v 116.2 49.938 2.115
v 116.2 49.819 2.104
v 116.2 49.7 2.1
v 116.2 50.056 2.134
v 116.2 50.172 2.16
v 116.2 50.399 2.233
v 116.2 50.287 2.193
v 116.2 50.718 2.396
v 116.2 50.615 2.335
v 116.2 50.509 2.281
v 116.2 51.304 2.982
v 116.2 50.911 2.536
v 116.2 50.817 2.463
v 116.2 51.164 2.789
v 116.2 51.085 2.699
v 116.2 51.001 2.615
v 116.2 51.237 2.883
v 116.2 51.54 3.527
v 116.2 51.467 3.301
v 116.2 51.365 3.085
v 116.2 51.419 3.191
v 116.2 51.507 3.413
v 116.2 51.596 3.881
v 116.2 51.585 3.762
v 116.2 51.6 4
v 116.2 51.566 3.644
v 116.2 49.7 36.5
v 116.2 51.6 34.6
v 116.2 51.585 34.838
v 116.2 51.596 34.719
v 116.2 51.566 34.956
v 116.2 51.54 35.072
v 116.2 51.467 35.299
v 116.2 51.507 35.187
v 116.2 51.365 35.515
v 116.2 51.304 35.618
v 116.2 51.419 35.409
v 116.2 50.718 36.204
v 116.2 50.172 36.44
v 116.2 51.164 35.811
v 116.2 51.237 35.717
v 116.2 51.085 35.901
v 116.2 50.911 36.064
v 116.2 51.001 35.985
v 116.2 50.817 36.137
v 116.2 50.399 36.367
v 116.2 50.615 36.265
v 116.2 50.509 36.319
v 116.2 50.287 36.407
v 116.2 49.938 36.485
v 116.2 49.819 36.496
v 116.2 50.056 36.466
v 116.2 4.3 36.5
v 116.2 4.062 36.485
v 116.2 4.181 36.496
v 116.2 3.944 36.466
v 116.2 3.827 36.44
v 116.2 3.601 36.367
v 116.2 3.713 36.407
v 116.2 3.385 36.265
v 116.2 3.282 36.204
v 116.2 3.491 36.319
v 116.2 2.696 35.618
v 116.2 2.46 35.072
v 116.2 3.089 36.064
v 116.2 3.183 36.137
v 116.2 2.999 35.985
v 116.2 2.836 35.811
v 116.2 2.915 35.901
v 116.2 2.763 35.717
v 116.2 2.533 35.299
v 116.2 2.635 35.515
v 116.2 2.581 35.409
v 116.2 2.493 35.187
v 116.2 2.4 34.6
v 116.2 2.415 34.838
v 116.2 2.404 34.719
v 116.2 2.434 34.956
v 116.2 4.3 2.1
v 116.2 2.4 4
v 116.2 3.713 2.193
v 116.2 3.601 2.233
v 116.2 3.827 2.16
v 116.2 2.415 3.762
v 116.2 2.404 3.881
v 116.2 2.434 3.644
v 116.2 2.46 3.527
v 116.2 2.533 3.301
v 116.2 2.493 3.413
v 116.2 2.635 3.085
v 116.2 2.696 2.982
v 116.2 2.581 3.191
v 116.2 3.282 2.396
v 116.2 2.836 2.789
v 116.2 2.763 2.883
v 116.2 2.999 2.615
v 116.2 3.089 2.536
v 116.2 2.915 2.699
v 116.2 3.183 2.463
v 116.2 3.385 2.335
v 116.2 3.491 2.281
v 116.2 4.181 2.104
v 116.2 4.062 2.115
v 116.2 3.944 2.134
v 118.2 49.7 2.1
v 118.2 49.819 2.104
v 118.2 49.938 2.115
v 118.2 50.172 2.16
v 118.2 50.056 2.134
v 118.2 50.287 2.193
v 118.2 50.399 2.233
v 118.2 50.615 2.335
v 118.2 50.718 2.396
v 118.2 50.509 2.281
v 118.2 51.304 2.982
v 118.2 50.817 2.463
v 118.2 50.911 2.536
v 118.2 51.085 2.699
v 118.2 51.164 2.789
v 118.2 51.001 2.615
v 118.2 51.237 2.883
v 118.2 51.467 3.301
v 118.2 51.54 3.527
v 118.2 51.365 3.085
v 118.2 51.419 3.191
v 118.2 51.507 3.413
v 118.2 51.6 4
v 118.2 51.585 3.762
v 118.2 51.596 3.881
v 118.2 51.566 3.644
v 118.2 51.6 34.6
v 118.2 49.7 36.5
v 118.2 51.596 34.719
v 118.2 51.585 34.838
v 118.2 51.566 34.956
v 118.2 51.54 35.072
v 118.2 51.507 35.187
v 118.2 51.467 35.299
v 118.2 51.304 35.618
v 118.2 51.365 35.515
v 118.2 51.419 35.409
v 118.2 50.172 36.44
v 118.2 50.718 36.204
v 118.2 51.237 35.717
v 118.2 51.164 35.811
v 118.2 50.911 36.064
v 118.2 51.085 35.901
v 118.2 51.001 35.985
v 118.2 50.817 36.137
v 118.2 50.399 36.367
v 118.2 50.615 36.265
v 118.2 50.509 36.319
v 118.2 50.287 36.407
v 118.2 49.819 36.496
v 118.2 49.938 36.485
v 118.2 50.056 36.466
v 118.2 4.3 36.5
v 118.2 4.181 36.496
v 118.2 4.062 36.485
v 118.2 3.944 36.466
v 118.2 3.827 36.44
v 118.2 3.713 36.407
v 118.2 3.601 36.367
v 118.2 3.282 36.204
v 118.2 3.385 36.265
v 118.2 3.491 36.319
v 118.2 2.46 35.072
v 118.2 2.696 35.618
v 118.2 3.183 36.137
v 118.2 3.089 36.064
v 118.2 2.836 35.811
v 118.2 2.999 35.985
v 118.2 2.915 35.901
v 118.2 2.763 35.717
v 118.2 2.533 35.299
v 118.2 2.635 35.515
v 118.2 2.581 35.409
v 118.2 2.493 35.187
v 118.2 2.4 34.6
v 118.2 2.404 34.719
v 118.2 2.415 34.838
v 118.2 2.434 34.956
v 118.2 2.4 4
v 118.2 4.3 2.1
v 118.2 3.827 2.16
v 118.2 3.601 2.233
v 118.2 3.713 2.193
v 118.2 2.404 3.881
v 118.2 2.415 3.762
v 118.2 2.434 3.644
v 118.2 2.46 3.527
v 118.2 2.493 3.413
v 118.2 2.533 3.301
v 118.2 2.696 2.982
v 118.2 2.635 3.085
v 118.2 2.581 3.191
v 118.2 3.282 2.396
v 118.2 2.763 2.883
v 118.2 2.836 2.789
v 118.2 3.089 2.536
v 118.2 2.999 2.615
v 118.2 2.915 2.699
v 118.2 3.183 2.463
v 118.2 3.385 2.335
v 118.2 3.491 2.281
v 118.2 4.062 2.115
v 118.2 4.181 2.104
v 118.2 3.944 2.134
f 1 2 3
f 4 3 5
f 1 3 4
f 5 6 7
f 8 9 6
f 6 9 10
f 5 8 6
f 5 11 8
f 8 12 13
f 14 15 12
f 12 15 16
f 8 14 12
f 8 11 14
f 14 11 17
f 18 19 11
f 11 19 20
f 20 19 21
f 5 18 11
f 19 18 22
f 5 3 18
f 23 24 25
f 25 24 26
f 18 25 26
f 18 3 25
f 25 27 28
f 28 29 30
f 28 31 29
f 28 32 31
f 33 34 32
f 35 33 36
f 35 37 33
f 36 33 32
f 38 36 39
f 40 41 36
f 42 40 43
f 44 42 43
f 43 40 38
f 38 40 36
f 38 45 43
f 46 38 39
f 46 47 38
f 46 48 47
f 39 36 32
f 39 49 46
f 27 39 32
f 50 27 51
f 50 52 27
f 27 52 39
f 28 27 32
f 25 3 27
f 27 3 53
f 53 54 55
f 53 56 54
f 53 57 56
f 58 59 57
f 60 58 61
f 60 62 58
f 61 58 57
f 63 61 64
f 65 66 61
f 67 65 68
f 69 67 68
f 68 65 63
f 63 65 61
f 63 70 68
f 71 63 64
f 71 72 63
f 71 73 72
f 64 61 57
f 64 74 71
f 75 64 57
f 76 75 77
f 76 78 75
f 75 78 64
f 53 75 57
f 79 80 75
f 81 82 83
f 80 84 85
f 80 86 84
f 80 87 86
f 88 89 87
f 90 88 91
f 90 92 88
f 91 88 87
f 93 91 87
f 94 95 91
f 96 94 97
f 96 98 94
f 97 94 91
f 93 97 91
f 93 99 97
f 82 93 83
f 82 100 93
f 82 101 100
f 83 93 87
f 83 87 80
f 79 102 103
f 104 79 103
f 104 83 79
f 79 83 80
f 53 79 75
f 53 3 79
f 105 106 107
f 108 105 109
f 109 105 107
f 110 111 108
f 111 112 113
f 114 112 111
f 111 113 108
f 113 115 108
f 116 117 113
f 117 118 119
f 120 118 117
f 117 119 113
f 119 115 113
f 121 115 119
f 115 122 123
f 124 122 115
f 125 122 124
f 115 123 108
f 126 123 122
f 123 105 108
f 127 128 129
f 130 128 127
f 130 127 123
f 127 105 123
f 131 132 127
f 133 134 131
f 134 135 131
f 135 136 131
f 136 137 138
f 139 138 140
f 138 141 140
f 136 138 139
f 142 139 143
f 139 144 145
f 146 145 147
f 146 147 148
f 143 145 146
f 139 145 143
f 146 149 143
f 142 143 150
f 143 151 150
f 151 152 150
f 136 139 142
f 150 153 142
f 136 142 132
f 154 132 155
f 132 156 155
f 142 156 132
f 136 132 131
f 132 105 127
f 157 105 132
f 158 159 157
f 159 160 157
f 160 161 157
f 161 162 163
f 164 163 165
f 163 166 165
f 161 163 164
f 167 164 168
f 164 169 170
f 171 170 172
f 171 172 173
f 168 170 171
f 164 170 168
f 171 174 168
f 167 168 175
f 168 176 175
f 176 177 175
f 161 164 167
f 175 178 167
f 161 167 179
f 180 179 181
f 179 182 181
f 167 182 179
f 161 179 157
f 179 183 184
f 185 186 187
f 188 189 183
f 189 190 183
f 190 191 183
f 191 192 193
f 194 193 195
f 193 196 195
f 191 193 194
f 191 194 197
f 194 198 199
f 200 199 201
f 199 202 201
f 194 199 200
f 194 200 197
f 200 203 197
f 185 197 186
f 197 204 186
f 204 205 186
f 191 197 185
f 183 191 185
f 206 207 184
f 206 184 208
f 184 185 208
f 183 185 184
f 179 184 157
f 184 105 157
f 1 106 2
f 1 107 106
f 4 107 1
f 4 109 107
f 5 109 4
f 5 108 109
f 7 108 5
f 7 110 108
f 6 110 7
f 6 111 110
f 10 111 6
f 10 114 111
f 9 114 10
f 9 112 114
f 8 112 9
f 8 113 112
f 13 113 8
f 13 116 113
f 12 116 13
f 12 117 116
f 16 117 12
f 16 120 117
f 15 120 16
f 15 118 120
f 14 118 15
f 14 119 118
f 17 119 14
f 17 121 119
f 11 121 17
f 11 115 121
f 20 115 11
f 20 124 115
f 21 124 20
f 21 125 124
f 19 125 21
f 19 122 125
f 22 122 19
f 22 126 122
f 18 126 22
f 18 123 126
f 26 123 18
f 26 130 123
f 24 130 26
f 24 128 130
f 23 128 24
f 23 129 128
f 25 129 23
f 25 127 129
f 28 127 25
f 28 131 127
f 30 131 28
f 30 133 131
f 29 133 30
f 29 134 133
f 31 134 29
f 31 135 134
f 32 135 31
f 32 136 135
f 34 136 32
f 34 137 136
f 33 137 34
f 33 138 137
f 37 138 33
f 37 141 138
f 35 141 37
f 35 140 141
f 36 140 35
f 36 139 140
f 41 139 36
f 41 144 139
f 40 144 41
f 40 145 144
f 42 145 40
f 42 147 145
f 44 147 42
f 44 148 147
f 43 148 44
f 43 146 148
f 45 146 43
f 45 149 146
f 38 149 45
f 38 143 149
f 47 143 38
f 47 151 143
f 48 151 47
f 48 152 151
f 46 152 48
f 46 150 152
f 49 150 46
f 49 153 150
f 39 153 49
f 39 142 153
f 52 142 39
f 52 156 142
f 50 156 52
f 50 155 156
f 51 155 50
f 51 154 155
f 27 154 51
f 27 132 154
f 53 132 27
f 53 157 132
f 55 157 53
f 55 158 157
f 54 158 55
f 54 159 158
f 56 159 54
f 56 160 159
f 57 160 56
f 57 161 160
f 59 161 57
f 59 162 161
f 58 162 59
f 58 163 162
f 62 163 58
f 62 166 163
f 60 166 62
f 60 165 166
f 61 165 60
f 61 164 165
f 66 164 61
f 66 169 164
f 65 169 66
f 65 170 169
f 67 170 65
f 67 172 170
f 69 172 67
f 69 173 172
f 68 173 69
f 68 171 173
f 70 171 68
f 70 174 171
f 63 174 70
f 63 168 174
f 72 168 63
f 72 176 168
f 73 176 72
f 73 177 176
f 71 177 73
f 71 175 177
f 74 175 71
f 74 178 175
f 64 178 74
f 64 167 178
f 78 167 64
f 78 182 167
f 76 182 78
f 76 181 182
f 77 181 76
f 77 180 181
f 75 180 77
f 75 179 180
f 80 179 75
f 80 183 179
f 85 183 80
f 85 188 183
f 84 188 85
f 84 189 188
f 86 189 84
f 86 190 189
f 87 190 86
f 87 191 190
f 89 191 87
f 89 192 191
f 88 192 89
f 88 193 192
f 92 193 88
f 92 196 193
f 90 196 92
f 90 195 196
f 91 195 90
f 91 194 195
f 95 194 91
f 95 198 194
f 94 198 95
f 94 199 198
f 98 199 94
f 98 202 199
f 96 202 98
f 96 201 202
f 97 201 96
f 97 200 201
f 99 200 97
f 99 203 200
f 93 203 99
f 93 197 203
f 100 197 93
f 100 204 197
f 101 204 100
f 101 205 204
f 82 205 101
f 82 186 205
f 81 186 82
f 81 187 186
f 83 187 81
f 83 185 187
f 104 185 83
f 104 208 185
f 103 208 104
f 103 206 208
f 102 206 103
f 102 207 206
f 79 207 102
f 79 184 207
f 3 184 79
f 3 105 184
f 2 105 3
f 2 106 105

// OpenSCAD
/* Box design originally by:
////////////////////////////////////////////////////////////////////
              -    FB Aka Heartman/Hearty 2016     -
              -   http://heartygfx.blogspot.com    -
              -       OpenScad Parametric Box      -
              -         CC BY-NC 3.0 License       -
////////////////////////////////////////////////////////////////////

Improved by jbebel:
http://github.com/jbebel/Ultimate-Box-Maker

To create a box, start by modifying the numerical parameters in the sections
below. This can be accomplished using a release of OpenSCAD newer than 2015.03.
As of the time of writing, this means that a development snapshot is required.
The Thingiverse Customizer may also potentially work, but at the time of
writing, it was inoperable.

The simplest choice is to hand-edit the .scad file. Feature toggles are
annotated with a comment. The other numerical parameters are measurements in
mm. Everything is parametrized, so if you double all the non-feature parameters
you will double the box size in every dimension. Certain parameters are derived
from other parameters. If you wish to override them, you may, but sensible
defaults have been chosen. Notably the design in this revision is particularly
PCB-centric, in that you should start with your PCB size and adjust the margins
around it to determine the box size. If you care more about the box size, you
can set the Length, Width, and Height explicitly, but read the comments around
them.

Once your box is sized appropriately, you can use the Panel modules to design
the holes and text for the front and back panels. Helper variables are provided
to assist you in positioning these holes relative to the PCB, if your holes are
for PCB-mounted components.

When you are ready to print, adjust the values in the "STL element to export"
section, and export each part one at a time.

Experimental options are provided for a screwless design, but these are
untested. In particular, the box fixation tabs may need thicknesses adjusted
in order to have the appropriate flexibility.
*/

// preview[view:north east, tilt:top diagonal]
//----------------------- Box parameters ---------------------------

/* [Box options] */
// - Wall thickness
Thick = 2;
// - Panel thickness
PanelThick = 2;
// - Font Thickness
FontThick = 0.5;
// - Filet Radius
Filet = 2;
// - 0 for beveled, 1 for rounded
Round = 1; // [0:No, 1:Yes]
// - Printer margin around interior cutouts
CutoutMargin = 0.3;
// - Margin between mating parts
PartMargin = 0.1;
// - PCB feet? (x4)
PCBFeet = 1; // [0:No, 1:Yes]
// - Decorations?
Decorations = 1; // [0:No, 1:Yes]
// - Decorations to ventilation holes
Vent = 1; // [0:No, 1:Yes]
// - Decoration-Holes width (in mm)
Vent_width = 3;
// - Tolerance (Panel/rails gap on one edge)
PanelThickGap = CutoutMargin + PartMargin;
PanelVerticalGap = PartMargin;
PanelHorizontalGap = CutoutMargin + PartMargin;


/* [Box Fixation Tabs] */
// - Side screw hole (or snap) diameter
ScrewHole = 2.2606;
// - Screw thread major diameter for outer shell
BoxHole = 2.8448;
// Thickness of fixation tabs
TabThick = 2;
// Back left tab
BLTab = 1; // [0:Bottom, 1:Top]
// Back right tab
BRTab = 1; // [0:Bottom, 1:Top]
// Front left tab
FLTab = 1; // [0:Bottom, 1:Top]
// Front right tab
FRTab = 1; // [0:Bottom, 1:Top]
// EXPERIMENTAL: Snap tabs
SnapTabs = 0; // [0:Screws, 1:Snaps]


/* [PCB options] */
// - PCB Length
PCBLength = 109;
// - PCB Width
PCBWidth = 40;
// - PCB Thickness
PCBThick = 1.6;
// You likely need to maintain |TabThick| margin on the left and right for tabs
// and whatnot.
// - Margin between front panel and PCB
FrontEdgeMargin = 1;
// - Margin between back panel and PCB
BackEdgeMargin = 1;
// - Margin between left wall and PCB
LeftEdgeMargin = 5;
// - Margin between right wall and PCB
RightEdgeMargin = 5;
// - Margin between top of PCB and box top.
TopMargin = 25;


/* [PCB_Feet] */
// - Foot height above box interior
FootHeight = 8;
// - Foot diameter
FootDia = 8;
// - Hole diameter, or peg for screwless design
FootHole = 0; // tap size for #4 coarse-thread
// - EXPERIMENTAL Screwless design
Screwless = 0; // [0:Screws, 1:Screwless]
FootFilet = 0;

// Foot centers are specified as distance from PCB back-left corner.
// X is along the "length" axis, and Y is along the "width" axis.
// - Foot 1 distance from back PCB edge
Foot1X = 4;
// - Foot 1 distance from left PCB edge
Foot1Y = 13;
// - Foot 2 distance from back PCB edge
Foot2X = 4;
// - Foot 2 distance from right PCB edge
Foot2YFromEdge = 25;
Foot2Y = PCBWidth - Foot2YFromEdge;

// - Foot 3 distance from front PCB edge
Foot3XFromEdge = 12;
Foot3X = PCBLength - Foot3XFromEdge;
// - Foot 3 distance from left PCB edge
Foot3Y = 3;

// - Foot 4 distance from front PCB edge
Foot4XFromEdge = 11;
Foot4X = PCBLength - Foot4XFromEdge;
// - Foot 4 distance from right PCB edge
Foot4YFromEdge = 4;
Foot4Y = PCBWidth - Foot4YFromEdge;


/* [STL element to export] */
// - Top shell
TShell = 0; // [0:No, 1:Yes]
// - Bottom shell
BShell = 0; // [0:No, 1:Yes]
// - Front panel
FPanL = 1; // [0:No, 1:Yes]
// - Back panel
BPanL = 0; // [0:No, 1:Yes]
// - Panel holes and text
PanelFeatures = 0; // [0:No, 1:Yes]


/* [Hidden] */
// - feet color
color_feet = "Red";

// - Shell color
Couleur1 = "Orange";
// - Panel color
Couleur2 = "OrangeRed";
// - Text color
TextColor = "White";
// - making decorations thicker if it is a vent to make sure they go through
// shell
// Add a small number to Thick in case Filet is 0.
Dec_Thick = Vent ? Thick*1.001 + Filet : Thick/2;
// Separate vents with a square pillar by default.
Dec_Spacing = Thick + Vent_width;
// X offset to center of first vent
Dec_Offset = Thick*2 + PanelThick + PanelThickGap*2 + Dec_Spacing - Vent_width/2;

// Resolution based on Round parameter. Set this first number to something
// smaller to speed up processing. It should always be a multiple of 4.
Resolution = Round ? 100: 4;

/* Calculate box dimensions from PCB. If you want a more box-centric design
   where the outer diameter of the box matters more than the margins around
   the PCB you can set these manually. The PCB will still be placedaccording
   to the left and back margins, and if you want to use the screwless box
   design, you will need to set the TopMargin to
   (Height - Thick*2 - FootHeight - PCBThick)
*/
Length = PCBLength + FrontEdgeMargin + BackEdgeMargin + ((Thick + PanelThick + PanelThickGap*2)*2);
Width = PCBWidth + LeftEdgeMargin + RightEdgeMargin + Thick*2;
Height = FootHeight + PCBThick + TopMargin + Thick*2;
echo("Box: ", Length=Length, Width=Width, Height=Height);
// X position inset of mounting holes and tabs
MountInset = Thick*3 + PanelThick + PanelThickGap*2 + ScrewHole*4;

// Calculate panel dimensions from box dimensions.
PanelWidth = Width - Thick*2 - PanelHorizontalGap*2;
PanelHeight = Height - Thick*2 - PanelVerticalGap*2;


/*  Panel Manager

    Use the below 4 modules to produce holes and text on the front and back
    panels. The holes modules should contain instances of SquareHole or
    CylinderHole defined later in this file. The text modules should contain
    instances of LText or CText defined later in this file. It is
    recommended to use variables that you define for your needs to create
    the size and positions of these objects.
*/

// Calculate board-relative positions with respect to the panel, for
// convenience in placing panel elements.
TopOfBoardWRTPanel = FootHeight + PCBThick - PanelVerticalGap;
LeftEdgeOfBoardWRTFPanel = LeftEdgeMargin - PanelHorizontalGap;
LeftEdgeOfBoardWRTBPanel = RightEdgeMargin - PanelHorizontalGap;
// Visible panel edges
PanelBottomEdge = Thick - PanelVerticalGap;
PanelTopEdge = PanelHeight - Thick + PanelVerticalGap;
PanelLeftEdge = Thick - PanelHorizontalGap;
PanelRightEdge = PanelWidth - Thick + PanelHorizontalGap;


// Holes for front panel
module FPanelHoles() {
    // SquareHole(On/Off, Xpos,Ypos,Length,Width,Filet)
    SquareHole(1, 20, 20, 15, 10, 1);
    SquareHole(1, 40, 20, 15, 10, 1);
    SquareHole(1, 60, 20, 15, 10, 1);
    // CylinderHole(On/Off, Xpos, Ypos, Diameter)
    CylinderHole(1, 27, 40, 8);
    CylinderHole(1, 47, 40, 8);
    CylinderHole(1, 67, 40, 8);
    SquareHole(1, 20, 50, 80, 30, 3);
    CylinderHole(1, 93, 30, 10);
    SquareHole(1, 120, 20, 30, 60, 3);
}


// Text for front panel
module FPanelText() {
    // LText(On/Off, Xpos, Ypos, "Font", Size, "Text", "HAlign", "VAlign")
    LText(1, 20, 83, "Arial Black", 4, "Digital Screen", HAlign="left");
    LText(1, 120, 83, "Arial Black", 4, "Level", HAlign="left");
    LText(1, 20, 11, "Arial Black", 6, "  1     2      3", HAlign="left");
    // CText(On/Off, Xpos, Ypos, "Font", Size, Diameter, Arc(Deg), Starting Angle(Deg),"Text")
    CText(1, 93, 29, "Arial Black", 4, 10, 180, 0,
          ["1", "." , "3", "." , "5", "." , "7", "." , "9", "." , "11"]);
}


// Holes for back panel
module BPanelHoles() {
    CylinderHole(1,
                 LeftEdgeOfBoardWRTBPanel + 16.4,
                 TopOfBoardWRTPanel + 7,
                 5 + PartMargin*2);
    SquareHole(1,
               LeftEdgeOfBoardWRTBPanel + 37.3,
               TopOfBoardWRTPanel,
               39.2,
               12.55,
               1);
}


// Text for back panel
module BPanelText() {
    LText(1,
          LeftEdgeOfBoardWRTBPanel + 16.4,
          TopOfBoardWRTPanel + 7 + 5,
          "Arial Black",
          4, "PWR"
    );
    LText(1,
          LeftEdgeOfBoardWRTBPanel + 37.3 + 39.2/2,
          TopOfBoardWRTPanel + 12.55 + 2,
          "Arial Black",
          4,
          "DATA"
    );
}


// ------- You probably don't need to modify anything below this line. --------


/* Generic rounded box

    Produces a box of the specified dimensions. Corners are rounded
    according to Filet and Resolution parameters.

    Arguments:
    xshrink: the amount to reduce the length on one end compared to the full
        length
    yzshrink: the amount to reduce the width or height on one edge compared
        to the full box
*/
module RoundBox(xshrink=0, yzshrink=0) {
    Filet = (Filet > Thick*2) ? Filet - yzshrink : Filet;
    translate([xshrink, yzshrink, yzshrink]) {
        rotate([90, 0, 90]) {
            linear_extrude(height=Length - xshrink*2) {
                translate([Filet, Filet, 0]) {
                    offset(r=Filet, $fn=Resolution) {
                        square([Width - 2*yzshrink - 2*Filet, Height - 2*yzshrink - 2*Filet]);
                    }
                }
            }
        }
    }
}


/*  MainBox: Main box module

    This module produces the simple main box half. No feet, tabs, vents or
    fixation is applied here.
*/
module MainBox() {
    difference() {
        union() {
            // Makes a hollow box with walls of Thick thickness.
            difference() {
                RoundBox();
                RoundBox(xshrink=Thick, yzshrink=Thick);
            }
            // Makes interior backing for panel as a wall
            difference() {
                RoundBox(xshrink=(Thick + PanelThick + PanelThickGap*2), yzshrink=Thick/2);
                RoundBox(xshrink=(Thick*2 + PanelThick + PanelThickGap*2));
            }
        }
        // Remove the top half
        translate([-Thick, -Thick, Height/2]) {
            cube([Length + Thick*2, Width + Thick*2, Height]);
        }
        // Remove the center for panel visibility.
        RoundBox(xshrink=-Thick, yzshrink=Thick*2);
    }
}


/*  decoration: a single box decoration
*/
module decoration() {
    translate([-Vent_width/2, -Thick, -Thick]) {
        cube([Vent_width, Dec_Thick + Thick, Height/4 + Thick]);
    }
}


/* LeftDecorations: left decorations module

    Produces the decorations/vents for just the left side of the box.
    These can be rotated and translated for the right side.
*/
module LeftDecorations() {
    for (i=[0 : Dec_Spacing : Length/4]) {
        /*translate([Dec_Offset + i, 0, 0]) {
            decoration();
        }*/
        translate([Length - Dec_Offset - i, 0, 0]) {
            decoration();
        }
    }
}


/*  Decorations: decorations module

    This module produces the box vents or decorations.
*/
module Decorations() {
     LeftDecorations();
    // Mirror for the right side decorations
    translate([0, Width, 0]) {
        mirror([0, 1, 0]) {
            LeftDecorations();
        }
    }
}


/*  Coque: Shell module

    This module takes no arguments, but produces a box shell. This is half
    the box, including slots for end panels, rounded corners according to
    Filet and Resolution, and vents/decorations according to parameters.
*/
module Coque() {
    color(Couleur1) {
        difference() {
            MainBox();
            if (Decorations) {
                Decorations();
            }
        }
    }
}


/*  tab: tab module

    Produces a single box fixation tab with screw hole or snap button
*/
module tab() {
    translate([0, Thick, Height/2]) {
        rotate([90, 0, 180]) {
            difference() {
                linear_extrude(TabThick) {
                    difference() {
                        circle(r=4*ScrewHole, $fn=6);
                        if (!SnapTabs) {
                            translate([0, ScrewHole*2-1.75, 0]) {
                                circle(d=ScrewHole, $fn=100);
                            }
                        }
                    }
                }
                translate([-4*ScrewHole, -ScrewHole, TabThick]) {
                    rotate([90+45, 0, 0]) {
                        cube([8*ScrewHole, 3*ScrewHole, 5*ScrewHole]);
                    }
                }
                translate([-4*ScrewHole, 0, -PartMargin]) {
                    cube([8*ScrewHole,4*ScrewHole,PartMargin*2]);
                }
            }
            if (SnapTabs) {
                translate([0, ScrewHole*2, PartMargin]) {
                    difference() {
                        sphere(d=(ScrewHole - PartMargin*2), $fn=100);
                        translate([0, 0, ScrewHole/2 + TabThick/2]) {
                            cube(ScrewHole, center=true);
                        }
                    }
                }
            }
        }
    }
}


/*  Tabs: tabs module

    This module produces the wall fixation box tabs.
    Tabs are produced according to the parameters for XXTab indicating top
    or bottom.

    Arguments:
        top: 0 for bottom shell tabs. 1 for top shell tabs. defaults to bottom.
*/
module Tabs(top=0) {
    color(Couleur1) {
        if (BLTab == top) {
            translate([MountInset, 0, 0]) {
                tab();
            }
        }
        if (FLTab == top) {
            translate([Length - MountInset, 0, 0]) {
                tab();
            }
        }
        if (BRTab == top) {
            translate([MountInset, Width, 0]) {
                rotate([0, 0, 180]) {
                    tab();
                }
            }
        }
        if (FRTab == top) {
            translate([Length - MountInset, Width, 0]) {
                rotate([0, 0, 180]) {
                    tab();
                }
            }
        }
    }
}


/*  hole: hole module

    Produces a box hole for fixation. This is either a cylinder for a screw
    or a semispherical indention for snap tabs.
*/
module hole() {
    if (SnapTabs) {
        translate([0, -Thick, Height/2 - 2*ScrewHole]) {
            sphere(d=ScrewHole, $fn=100);
        }
    }
    else {
        translate([0, Thick, Height/2  + 2 - 2*ScrewHole]) {
            rotate([90, 0, 0]) {
                cylinder(Thick*3, d=BoxHole, $fn=100);
            }
        }
    }
}


/*  Holes: holes module

    This module produces the holes necessary in the box fixation tabs and in
    the wall of the box for the corresponding tabs to affix to. Holes are
    produced according to the parameters for XXTab indicating top or bottom.

    Arguments:
        top: 0 for bottom shell holes. 1 for top shell holes. defaults to
            bottom.
*/
module Holes(top=0) {
    color(Couleur1) {
        if (BRTab != top) {
            translate([MountInset, Width, 0]) {
                hole();
            }
        }
        if (FRTab != top) {
            translate([Length - MountInset, Width, 0]) {
                hole();
            }
        }
        if (BLTab != top) {
            translate([MountInset, 0, 0]) {
                rotate([0, 0, 180]) {
                    hole();
                }
            }
        }
        if (FLTab != top) {
            translate([Length - MountInset, 0, 0]) {
                rotate([0, 0, 180]) {
                    hole();
                }
            }
        }
    }
}

/*  PCB: PCB module

    Produces the model of the PCB using parameters for its size and thickness.
    The text PCB is placed on top of the board. This is called by the Feet()
    module with the % modifier which makes this module translucent and only
    viewed in preview mode.
*/
module PCB() {
    translate([0, 0, FootHeight]) {
        cube([PCBLength, PCBWidth, PCBThick]);
        translate([PCBLength/2, PCBWidth/2, PCBThick]) {
            color("Olive") {
                linear_extrude(height=FontThick) {
                    text("PCB", font="Arial black", halign="center", valign="center");
                }
            }
        }
    }
}


/*  foot module

    Produces a single foot for PCB mounting.
*/
module foot(top=0) {
    color(color_feet) {
        rotate_extrude($fn=100) {
            difference() {
                union() {
                    if (Screwless && top) { // Foot with TopMargin height
                        square([FootDia/2 + FootFilet, TopMargin]);
                    }
                    else if (Screwless && !top) { // Foot for PCB peg
                        square([FootDia/2 + FootFilet, FootHeight + PCBThick*2]);
                    }
                    else if (!Screwless && !top) { // Foot with screw hole
                        translate([FootHole/2 + CutoutMargin, 0, 0]) {
                            square([(FootDia - FootHole)/2 - CutoutMargin + FootFilet, FootHeight]);
                        }
                    }
                }
                translate([FootDia/2 + FootFilet, FootFilet, 0]) {
                    offset(r=FootFilet, $fn=Resolution) {
                        square(Height);
                    }
                }
                if (Screwless && !top) { // Remove around peg
                    translate([FootHole/2 - PartMargin, FootHeight]) {
                        polygon([[0, 0],
                                 [FootDia/2, 0],
                                 [FootDia/2, PCBThick*3],
                                 [-FootHole/3, PCBThick*3],
                                 [0, PCBThick]
                                ]
                        );
                    }
                }
                if (Screwless && top) { // Remove hole for peg
                    translate([-FootHole/2, TopMargin - PCBThick, 0]) {
                        polygon([[0, 0],
                                 [(FootHole*5/6 + CutoutMargin), 0],
                                 [(FootHole + CutoutMargin), PCBThick],
                                 [(FootHole + CutoutMargin), PCBThick*2],
                                 [0, PCBThick*2],
                                ]
                        );
                    }
                }

            }
        }
    }
}


/*  Feet module

    Combines four feet to form mounting platform for PCB.
    A model of the PCB is included with the background modifier. It is
    translucent but visible in the preview, but not in the final render.

    No arguments are used, but parameters provide the PCB and foot dimensions.
*/
module Feet(top=0) {
    translate([BackEdgeMargin + Thick + PanelThick + PanelThickGap*2, LeftEdgeMargin + Thick, Thick]) {
        if (!top) {
          //  %PCB();
        }

        if (Screwless || !top ) {
            translate([Foot1X, Foot1Y]) {
                foot(top=top);
            }
            translate([Foot2X, Foot2Y]) {
                foot(top=top);
                }
            translate([Foot3X, Foot3Y]) {
                foot(top=top);
                }
            translate([Foot4X, Foot4Y]) {
                foot(top=top);
            }
        }
    }
}


/*  TopShell: top shell module

    Produces the top shell, including requested fixation tabs and holes
    Model is rotated and translated to the appropriate position.
*/
module TopShell() {
    translate([0, 0, Height + 0.2]) {
        mirror([0, 0, 1]) {
            difference() {
                union() {
                    Coque();
                    Tabs(top=1);
                    if (Screwless && PCBFeet) {
                       Feet(top=1);
                    }
                }
                Holes(top=1);
            }
        }
    }
}


/*  BottomShell: bottom shell module

    Produces the bottom shell, including requested fixation tabs, holes,
    and PCB feet.
*/
module BottomShell() {
    difference() {
        union() {
            Coque();
            Tabs();
            if (PCBFeet) {
               Feet(top=0);
            }
        }
        Holes();
    }
}


/*  Panel module

    Produces a single panel with potentially rounded corners. Takes no
    arguments but uses the global parameters.
*/
module Panel() {
    Filet = (Filet > Thick*2) ? Filet - Thick - PanelVerticalGap : Filet - PanelVerticalGap;
    echo("Panel:", Thick=PanelThick, PanelWidth=PanelWidth, PanelHeight=PanelHeight, Filet=Filet);
    translate([Filet, Filet, 0]) {
        offset(r=Filet, $fn=Resolution) {
            square([PanelWidth - Filet*2, PanelHeight - Filet*2]);
        }
    }
}


/*  Cylinder Hole module

    Produces a cylinder for use as a holein a panel

    Arguments:
    OnOff: Rendered only if 1
    Cx: X position of hole center
    Cy: Y position of hole center
    Cdia: diameter of hole
*/
module CylinderHole(OnOff, Cx, Cy, Cdia) {
    if (OnOff) {
        echo("CylinderHole:", Cx=Cx, Cy=Cy, Cdia=Cdia + CutoutMargin*2);
        translate([Cx, Cy, 0]) {
            circle(d=Cdia + CutoutMargin*2, $fn=100);
        }
    }
}


/*  Square Hole module

    Produces a rectangular prism with potentially rounded corner for use as
    a hole in a panel

    Arguments:
    OnOff: Rendered only if 1
    Sx: X position of bottom left corner
    Sy: Y position of bottom left corner
    Sl: width of rectangle
    Sw: height of rectangle
    Filet: radius of rounded corner
*/
module SquareHole(OnOff, Sx, Sy, Sl, Sw, Filet) {
    if (OnOff) {
        Offset = Filet + CutoutMargin;
        echo("SquareHole:", Sx=Sx - CutoutMargin, Sy=Sy - CutoutMargin,
             Sl=Sl + CutoutMargin*2, Sw=Sw + CutoutMargin*2, Filet=Offset);
        translate([Sx + Filet, Sy + Filet, 0]) {
            offset(r=Offset, $fn=Resolution) {
                square([Sl - Filet*2, Sw - Filet*2]);
            }
        }
    }
}


/*  LText module

    Produces linear text for use on a panel

    Arguments:
    OnOff: Rendered only if 1
    Tx: X position of bottom left corner of text
    Ty: Y position of bottom left corner of text
    Font: Font to use for text
    Size: Approximate Height of text in mm.
    Content: The text
    HAlign: Text horizontal alignment. Defaults to "center". "left" and
        "right" available.
    VAlign: Text vertical alignment. Defaults to "baseline". "top",
        "center", and "bottom" available.
*/
module LText(OnOff,Tx,Ty,Font,Size,Content, HAlign="center", VAlign="baseline") {
    if (OnOff) {
        echo("LText:", Tx=Tx, Ty=Ty, Font=Font, Size=Size, Content=Content, HAlign=HAlign, VAlign=VAlign);
        translate([Tx, Ty, PanelThick]) {
            linear_extrude(height=FontThick) {
                text(Content, size=Size, font=Font, halign=HAlign, valign=VAlign);
            }
        }
    }
}


/*  CText module

    Produces circular text for a panel

    OnOff:Rendered only if 1
    Tx: X position of text
    Ty: Y position of text
    Font: Font to use for text
    Size: Approximate height of text in mm
    TxtRadius: Radius of text
    Angl: Arc angle
    Turn: Starting angle
    Content: The text
*/
module CText(OnOff, Tx, Ty, Font, Size, TxtRadius, Angl, Turn, Content) {
    if (OnOff) {
        echo("CText:", Tx=Tx, Ty=Ty, Font=Font, Size=Size,
             TxtRadius=TxtRadius, Turn=Turn, Content=Content);
        Angle = -Angl / (len(Content) - 1);
        translate([Tx, Ty, PanelThick]) {
            for (i= [0 : len(Content) - 1] ) {
                rotate([0, 0, i*Angle + 90 + Turn]) {
                    translate([0, TxtRadius, 0]) {
                        linear_extrude(height=FontThick) {
                            text(Content[i], size=Size, font=Font, halign="center");
                        }
                    }
                }
            }
        }
    }
}


/*  FPanL module

    Produces the front panel. No arguments are used, but this module imports
    FPanelHoles() and FPanelText() which must be edited to produce holes and
    text for your box.
*/
module FPanL() {
    translate([Length - (Thick + PanelThickGap + PanelThick),
               Thick + PanelHorizontalGap,
               Thick + PanelVerticalGap]) {
        rotate([90, 0, 90]) {
            color(Couleur2) {
                //panel thinkness here 
                linear_extrude(height=PanelThick) {
                    difference() {
                        Panel();
                        if (PanelFeatures) {
                            FPanelHoles();
                        }
                    }
                }
            }
            color(TextColor) {
                if (PanelFeatures) {
                    FPanelText();
                }
            }
        }
    }
}


/*  BPanL module

    Produces the back panel. No arguments are used, but this module imports
    BPanelHoles() and BPanelText() which must be edited to produce holes and
    text for your box.
*/
module BPanL() {
    translate([Thick + PanelThickGap + PanelThick,
               Thick + PanelHorizontalGap + PanelWidth,
               Thick + PanelVerticalGap]) {
        rotate([90, 0, 270]) {
            color(Couleur2) {
                linear_extrude(height=PanelThick) {
                    difference() {
                        Panel();
                        if (PanelFeatures) {
                            BPanelHoles();
                        }
                    }
                }
            }
            color(TextColor) {
                if (PanelFeatures) {
                    BPanelText();
                }
            }
        }
    }
}


// Top shell
if (TShell) {
    TopShell();
}

// Bottom shell
if (BShell) {
    BottomShell();
}

// Front panel
if (FPanL) {
    FPanL();
}

// Back panel
if (BPanL) {
    BPanL();
}
